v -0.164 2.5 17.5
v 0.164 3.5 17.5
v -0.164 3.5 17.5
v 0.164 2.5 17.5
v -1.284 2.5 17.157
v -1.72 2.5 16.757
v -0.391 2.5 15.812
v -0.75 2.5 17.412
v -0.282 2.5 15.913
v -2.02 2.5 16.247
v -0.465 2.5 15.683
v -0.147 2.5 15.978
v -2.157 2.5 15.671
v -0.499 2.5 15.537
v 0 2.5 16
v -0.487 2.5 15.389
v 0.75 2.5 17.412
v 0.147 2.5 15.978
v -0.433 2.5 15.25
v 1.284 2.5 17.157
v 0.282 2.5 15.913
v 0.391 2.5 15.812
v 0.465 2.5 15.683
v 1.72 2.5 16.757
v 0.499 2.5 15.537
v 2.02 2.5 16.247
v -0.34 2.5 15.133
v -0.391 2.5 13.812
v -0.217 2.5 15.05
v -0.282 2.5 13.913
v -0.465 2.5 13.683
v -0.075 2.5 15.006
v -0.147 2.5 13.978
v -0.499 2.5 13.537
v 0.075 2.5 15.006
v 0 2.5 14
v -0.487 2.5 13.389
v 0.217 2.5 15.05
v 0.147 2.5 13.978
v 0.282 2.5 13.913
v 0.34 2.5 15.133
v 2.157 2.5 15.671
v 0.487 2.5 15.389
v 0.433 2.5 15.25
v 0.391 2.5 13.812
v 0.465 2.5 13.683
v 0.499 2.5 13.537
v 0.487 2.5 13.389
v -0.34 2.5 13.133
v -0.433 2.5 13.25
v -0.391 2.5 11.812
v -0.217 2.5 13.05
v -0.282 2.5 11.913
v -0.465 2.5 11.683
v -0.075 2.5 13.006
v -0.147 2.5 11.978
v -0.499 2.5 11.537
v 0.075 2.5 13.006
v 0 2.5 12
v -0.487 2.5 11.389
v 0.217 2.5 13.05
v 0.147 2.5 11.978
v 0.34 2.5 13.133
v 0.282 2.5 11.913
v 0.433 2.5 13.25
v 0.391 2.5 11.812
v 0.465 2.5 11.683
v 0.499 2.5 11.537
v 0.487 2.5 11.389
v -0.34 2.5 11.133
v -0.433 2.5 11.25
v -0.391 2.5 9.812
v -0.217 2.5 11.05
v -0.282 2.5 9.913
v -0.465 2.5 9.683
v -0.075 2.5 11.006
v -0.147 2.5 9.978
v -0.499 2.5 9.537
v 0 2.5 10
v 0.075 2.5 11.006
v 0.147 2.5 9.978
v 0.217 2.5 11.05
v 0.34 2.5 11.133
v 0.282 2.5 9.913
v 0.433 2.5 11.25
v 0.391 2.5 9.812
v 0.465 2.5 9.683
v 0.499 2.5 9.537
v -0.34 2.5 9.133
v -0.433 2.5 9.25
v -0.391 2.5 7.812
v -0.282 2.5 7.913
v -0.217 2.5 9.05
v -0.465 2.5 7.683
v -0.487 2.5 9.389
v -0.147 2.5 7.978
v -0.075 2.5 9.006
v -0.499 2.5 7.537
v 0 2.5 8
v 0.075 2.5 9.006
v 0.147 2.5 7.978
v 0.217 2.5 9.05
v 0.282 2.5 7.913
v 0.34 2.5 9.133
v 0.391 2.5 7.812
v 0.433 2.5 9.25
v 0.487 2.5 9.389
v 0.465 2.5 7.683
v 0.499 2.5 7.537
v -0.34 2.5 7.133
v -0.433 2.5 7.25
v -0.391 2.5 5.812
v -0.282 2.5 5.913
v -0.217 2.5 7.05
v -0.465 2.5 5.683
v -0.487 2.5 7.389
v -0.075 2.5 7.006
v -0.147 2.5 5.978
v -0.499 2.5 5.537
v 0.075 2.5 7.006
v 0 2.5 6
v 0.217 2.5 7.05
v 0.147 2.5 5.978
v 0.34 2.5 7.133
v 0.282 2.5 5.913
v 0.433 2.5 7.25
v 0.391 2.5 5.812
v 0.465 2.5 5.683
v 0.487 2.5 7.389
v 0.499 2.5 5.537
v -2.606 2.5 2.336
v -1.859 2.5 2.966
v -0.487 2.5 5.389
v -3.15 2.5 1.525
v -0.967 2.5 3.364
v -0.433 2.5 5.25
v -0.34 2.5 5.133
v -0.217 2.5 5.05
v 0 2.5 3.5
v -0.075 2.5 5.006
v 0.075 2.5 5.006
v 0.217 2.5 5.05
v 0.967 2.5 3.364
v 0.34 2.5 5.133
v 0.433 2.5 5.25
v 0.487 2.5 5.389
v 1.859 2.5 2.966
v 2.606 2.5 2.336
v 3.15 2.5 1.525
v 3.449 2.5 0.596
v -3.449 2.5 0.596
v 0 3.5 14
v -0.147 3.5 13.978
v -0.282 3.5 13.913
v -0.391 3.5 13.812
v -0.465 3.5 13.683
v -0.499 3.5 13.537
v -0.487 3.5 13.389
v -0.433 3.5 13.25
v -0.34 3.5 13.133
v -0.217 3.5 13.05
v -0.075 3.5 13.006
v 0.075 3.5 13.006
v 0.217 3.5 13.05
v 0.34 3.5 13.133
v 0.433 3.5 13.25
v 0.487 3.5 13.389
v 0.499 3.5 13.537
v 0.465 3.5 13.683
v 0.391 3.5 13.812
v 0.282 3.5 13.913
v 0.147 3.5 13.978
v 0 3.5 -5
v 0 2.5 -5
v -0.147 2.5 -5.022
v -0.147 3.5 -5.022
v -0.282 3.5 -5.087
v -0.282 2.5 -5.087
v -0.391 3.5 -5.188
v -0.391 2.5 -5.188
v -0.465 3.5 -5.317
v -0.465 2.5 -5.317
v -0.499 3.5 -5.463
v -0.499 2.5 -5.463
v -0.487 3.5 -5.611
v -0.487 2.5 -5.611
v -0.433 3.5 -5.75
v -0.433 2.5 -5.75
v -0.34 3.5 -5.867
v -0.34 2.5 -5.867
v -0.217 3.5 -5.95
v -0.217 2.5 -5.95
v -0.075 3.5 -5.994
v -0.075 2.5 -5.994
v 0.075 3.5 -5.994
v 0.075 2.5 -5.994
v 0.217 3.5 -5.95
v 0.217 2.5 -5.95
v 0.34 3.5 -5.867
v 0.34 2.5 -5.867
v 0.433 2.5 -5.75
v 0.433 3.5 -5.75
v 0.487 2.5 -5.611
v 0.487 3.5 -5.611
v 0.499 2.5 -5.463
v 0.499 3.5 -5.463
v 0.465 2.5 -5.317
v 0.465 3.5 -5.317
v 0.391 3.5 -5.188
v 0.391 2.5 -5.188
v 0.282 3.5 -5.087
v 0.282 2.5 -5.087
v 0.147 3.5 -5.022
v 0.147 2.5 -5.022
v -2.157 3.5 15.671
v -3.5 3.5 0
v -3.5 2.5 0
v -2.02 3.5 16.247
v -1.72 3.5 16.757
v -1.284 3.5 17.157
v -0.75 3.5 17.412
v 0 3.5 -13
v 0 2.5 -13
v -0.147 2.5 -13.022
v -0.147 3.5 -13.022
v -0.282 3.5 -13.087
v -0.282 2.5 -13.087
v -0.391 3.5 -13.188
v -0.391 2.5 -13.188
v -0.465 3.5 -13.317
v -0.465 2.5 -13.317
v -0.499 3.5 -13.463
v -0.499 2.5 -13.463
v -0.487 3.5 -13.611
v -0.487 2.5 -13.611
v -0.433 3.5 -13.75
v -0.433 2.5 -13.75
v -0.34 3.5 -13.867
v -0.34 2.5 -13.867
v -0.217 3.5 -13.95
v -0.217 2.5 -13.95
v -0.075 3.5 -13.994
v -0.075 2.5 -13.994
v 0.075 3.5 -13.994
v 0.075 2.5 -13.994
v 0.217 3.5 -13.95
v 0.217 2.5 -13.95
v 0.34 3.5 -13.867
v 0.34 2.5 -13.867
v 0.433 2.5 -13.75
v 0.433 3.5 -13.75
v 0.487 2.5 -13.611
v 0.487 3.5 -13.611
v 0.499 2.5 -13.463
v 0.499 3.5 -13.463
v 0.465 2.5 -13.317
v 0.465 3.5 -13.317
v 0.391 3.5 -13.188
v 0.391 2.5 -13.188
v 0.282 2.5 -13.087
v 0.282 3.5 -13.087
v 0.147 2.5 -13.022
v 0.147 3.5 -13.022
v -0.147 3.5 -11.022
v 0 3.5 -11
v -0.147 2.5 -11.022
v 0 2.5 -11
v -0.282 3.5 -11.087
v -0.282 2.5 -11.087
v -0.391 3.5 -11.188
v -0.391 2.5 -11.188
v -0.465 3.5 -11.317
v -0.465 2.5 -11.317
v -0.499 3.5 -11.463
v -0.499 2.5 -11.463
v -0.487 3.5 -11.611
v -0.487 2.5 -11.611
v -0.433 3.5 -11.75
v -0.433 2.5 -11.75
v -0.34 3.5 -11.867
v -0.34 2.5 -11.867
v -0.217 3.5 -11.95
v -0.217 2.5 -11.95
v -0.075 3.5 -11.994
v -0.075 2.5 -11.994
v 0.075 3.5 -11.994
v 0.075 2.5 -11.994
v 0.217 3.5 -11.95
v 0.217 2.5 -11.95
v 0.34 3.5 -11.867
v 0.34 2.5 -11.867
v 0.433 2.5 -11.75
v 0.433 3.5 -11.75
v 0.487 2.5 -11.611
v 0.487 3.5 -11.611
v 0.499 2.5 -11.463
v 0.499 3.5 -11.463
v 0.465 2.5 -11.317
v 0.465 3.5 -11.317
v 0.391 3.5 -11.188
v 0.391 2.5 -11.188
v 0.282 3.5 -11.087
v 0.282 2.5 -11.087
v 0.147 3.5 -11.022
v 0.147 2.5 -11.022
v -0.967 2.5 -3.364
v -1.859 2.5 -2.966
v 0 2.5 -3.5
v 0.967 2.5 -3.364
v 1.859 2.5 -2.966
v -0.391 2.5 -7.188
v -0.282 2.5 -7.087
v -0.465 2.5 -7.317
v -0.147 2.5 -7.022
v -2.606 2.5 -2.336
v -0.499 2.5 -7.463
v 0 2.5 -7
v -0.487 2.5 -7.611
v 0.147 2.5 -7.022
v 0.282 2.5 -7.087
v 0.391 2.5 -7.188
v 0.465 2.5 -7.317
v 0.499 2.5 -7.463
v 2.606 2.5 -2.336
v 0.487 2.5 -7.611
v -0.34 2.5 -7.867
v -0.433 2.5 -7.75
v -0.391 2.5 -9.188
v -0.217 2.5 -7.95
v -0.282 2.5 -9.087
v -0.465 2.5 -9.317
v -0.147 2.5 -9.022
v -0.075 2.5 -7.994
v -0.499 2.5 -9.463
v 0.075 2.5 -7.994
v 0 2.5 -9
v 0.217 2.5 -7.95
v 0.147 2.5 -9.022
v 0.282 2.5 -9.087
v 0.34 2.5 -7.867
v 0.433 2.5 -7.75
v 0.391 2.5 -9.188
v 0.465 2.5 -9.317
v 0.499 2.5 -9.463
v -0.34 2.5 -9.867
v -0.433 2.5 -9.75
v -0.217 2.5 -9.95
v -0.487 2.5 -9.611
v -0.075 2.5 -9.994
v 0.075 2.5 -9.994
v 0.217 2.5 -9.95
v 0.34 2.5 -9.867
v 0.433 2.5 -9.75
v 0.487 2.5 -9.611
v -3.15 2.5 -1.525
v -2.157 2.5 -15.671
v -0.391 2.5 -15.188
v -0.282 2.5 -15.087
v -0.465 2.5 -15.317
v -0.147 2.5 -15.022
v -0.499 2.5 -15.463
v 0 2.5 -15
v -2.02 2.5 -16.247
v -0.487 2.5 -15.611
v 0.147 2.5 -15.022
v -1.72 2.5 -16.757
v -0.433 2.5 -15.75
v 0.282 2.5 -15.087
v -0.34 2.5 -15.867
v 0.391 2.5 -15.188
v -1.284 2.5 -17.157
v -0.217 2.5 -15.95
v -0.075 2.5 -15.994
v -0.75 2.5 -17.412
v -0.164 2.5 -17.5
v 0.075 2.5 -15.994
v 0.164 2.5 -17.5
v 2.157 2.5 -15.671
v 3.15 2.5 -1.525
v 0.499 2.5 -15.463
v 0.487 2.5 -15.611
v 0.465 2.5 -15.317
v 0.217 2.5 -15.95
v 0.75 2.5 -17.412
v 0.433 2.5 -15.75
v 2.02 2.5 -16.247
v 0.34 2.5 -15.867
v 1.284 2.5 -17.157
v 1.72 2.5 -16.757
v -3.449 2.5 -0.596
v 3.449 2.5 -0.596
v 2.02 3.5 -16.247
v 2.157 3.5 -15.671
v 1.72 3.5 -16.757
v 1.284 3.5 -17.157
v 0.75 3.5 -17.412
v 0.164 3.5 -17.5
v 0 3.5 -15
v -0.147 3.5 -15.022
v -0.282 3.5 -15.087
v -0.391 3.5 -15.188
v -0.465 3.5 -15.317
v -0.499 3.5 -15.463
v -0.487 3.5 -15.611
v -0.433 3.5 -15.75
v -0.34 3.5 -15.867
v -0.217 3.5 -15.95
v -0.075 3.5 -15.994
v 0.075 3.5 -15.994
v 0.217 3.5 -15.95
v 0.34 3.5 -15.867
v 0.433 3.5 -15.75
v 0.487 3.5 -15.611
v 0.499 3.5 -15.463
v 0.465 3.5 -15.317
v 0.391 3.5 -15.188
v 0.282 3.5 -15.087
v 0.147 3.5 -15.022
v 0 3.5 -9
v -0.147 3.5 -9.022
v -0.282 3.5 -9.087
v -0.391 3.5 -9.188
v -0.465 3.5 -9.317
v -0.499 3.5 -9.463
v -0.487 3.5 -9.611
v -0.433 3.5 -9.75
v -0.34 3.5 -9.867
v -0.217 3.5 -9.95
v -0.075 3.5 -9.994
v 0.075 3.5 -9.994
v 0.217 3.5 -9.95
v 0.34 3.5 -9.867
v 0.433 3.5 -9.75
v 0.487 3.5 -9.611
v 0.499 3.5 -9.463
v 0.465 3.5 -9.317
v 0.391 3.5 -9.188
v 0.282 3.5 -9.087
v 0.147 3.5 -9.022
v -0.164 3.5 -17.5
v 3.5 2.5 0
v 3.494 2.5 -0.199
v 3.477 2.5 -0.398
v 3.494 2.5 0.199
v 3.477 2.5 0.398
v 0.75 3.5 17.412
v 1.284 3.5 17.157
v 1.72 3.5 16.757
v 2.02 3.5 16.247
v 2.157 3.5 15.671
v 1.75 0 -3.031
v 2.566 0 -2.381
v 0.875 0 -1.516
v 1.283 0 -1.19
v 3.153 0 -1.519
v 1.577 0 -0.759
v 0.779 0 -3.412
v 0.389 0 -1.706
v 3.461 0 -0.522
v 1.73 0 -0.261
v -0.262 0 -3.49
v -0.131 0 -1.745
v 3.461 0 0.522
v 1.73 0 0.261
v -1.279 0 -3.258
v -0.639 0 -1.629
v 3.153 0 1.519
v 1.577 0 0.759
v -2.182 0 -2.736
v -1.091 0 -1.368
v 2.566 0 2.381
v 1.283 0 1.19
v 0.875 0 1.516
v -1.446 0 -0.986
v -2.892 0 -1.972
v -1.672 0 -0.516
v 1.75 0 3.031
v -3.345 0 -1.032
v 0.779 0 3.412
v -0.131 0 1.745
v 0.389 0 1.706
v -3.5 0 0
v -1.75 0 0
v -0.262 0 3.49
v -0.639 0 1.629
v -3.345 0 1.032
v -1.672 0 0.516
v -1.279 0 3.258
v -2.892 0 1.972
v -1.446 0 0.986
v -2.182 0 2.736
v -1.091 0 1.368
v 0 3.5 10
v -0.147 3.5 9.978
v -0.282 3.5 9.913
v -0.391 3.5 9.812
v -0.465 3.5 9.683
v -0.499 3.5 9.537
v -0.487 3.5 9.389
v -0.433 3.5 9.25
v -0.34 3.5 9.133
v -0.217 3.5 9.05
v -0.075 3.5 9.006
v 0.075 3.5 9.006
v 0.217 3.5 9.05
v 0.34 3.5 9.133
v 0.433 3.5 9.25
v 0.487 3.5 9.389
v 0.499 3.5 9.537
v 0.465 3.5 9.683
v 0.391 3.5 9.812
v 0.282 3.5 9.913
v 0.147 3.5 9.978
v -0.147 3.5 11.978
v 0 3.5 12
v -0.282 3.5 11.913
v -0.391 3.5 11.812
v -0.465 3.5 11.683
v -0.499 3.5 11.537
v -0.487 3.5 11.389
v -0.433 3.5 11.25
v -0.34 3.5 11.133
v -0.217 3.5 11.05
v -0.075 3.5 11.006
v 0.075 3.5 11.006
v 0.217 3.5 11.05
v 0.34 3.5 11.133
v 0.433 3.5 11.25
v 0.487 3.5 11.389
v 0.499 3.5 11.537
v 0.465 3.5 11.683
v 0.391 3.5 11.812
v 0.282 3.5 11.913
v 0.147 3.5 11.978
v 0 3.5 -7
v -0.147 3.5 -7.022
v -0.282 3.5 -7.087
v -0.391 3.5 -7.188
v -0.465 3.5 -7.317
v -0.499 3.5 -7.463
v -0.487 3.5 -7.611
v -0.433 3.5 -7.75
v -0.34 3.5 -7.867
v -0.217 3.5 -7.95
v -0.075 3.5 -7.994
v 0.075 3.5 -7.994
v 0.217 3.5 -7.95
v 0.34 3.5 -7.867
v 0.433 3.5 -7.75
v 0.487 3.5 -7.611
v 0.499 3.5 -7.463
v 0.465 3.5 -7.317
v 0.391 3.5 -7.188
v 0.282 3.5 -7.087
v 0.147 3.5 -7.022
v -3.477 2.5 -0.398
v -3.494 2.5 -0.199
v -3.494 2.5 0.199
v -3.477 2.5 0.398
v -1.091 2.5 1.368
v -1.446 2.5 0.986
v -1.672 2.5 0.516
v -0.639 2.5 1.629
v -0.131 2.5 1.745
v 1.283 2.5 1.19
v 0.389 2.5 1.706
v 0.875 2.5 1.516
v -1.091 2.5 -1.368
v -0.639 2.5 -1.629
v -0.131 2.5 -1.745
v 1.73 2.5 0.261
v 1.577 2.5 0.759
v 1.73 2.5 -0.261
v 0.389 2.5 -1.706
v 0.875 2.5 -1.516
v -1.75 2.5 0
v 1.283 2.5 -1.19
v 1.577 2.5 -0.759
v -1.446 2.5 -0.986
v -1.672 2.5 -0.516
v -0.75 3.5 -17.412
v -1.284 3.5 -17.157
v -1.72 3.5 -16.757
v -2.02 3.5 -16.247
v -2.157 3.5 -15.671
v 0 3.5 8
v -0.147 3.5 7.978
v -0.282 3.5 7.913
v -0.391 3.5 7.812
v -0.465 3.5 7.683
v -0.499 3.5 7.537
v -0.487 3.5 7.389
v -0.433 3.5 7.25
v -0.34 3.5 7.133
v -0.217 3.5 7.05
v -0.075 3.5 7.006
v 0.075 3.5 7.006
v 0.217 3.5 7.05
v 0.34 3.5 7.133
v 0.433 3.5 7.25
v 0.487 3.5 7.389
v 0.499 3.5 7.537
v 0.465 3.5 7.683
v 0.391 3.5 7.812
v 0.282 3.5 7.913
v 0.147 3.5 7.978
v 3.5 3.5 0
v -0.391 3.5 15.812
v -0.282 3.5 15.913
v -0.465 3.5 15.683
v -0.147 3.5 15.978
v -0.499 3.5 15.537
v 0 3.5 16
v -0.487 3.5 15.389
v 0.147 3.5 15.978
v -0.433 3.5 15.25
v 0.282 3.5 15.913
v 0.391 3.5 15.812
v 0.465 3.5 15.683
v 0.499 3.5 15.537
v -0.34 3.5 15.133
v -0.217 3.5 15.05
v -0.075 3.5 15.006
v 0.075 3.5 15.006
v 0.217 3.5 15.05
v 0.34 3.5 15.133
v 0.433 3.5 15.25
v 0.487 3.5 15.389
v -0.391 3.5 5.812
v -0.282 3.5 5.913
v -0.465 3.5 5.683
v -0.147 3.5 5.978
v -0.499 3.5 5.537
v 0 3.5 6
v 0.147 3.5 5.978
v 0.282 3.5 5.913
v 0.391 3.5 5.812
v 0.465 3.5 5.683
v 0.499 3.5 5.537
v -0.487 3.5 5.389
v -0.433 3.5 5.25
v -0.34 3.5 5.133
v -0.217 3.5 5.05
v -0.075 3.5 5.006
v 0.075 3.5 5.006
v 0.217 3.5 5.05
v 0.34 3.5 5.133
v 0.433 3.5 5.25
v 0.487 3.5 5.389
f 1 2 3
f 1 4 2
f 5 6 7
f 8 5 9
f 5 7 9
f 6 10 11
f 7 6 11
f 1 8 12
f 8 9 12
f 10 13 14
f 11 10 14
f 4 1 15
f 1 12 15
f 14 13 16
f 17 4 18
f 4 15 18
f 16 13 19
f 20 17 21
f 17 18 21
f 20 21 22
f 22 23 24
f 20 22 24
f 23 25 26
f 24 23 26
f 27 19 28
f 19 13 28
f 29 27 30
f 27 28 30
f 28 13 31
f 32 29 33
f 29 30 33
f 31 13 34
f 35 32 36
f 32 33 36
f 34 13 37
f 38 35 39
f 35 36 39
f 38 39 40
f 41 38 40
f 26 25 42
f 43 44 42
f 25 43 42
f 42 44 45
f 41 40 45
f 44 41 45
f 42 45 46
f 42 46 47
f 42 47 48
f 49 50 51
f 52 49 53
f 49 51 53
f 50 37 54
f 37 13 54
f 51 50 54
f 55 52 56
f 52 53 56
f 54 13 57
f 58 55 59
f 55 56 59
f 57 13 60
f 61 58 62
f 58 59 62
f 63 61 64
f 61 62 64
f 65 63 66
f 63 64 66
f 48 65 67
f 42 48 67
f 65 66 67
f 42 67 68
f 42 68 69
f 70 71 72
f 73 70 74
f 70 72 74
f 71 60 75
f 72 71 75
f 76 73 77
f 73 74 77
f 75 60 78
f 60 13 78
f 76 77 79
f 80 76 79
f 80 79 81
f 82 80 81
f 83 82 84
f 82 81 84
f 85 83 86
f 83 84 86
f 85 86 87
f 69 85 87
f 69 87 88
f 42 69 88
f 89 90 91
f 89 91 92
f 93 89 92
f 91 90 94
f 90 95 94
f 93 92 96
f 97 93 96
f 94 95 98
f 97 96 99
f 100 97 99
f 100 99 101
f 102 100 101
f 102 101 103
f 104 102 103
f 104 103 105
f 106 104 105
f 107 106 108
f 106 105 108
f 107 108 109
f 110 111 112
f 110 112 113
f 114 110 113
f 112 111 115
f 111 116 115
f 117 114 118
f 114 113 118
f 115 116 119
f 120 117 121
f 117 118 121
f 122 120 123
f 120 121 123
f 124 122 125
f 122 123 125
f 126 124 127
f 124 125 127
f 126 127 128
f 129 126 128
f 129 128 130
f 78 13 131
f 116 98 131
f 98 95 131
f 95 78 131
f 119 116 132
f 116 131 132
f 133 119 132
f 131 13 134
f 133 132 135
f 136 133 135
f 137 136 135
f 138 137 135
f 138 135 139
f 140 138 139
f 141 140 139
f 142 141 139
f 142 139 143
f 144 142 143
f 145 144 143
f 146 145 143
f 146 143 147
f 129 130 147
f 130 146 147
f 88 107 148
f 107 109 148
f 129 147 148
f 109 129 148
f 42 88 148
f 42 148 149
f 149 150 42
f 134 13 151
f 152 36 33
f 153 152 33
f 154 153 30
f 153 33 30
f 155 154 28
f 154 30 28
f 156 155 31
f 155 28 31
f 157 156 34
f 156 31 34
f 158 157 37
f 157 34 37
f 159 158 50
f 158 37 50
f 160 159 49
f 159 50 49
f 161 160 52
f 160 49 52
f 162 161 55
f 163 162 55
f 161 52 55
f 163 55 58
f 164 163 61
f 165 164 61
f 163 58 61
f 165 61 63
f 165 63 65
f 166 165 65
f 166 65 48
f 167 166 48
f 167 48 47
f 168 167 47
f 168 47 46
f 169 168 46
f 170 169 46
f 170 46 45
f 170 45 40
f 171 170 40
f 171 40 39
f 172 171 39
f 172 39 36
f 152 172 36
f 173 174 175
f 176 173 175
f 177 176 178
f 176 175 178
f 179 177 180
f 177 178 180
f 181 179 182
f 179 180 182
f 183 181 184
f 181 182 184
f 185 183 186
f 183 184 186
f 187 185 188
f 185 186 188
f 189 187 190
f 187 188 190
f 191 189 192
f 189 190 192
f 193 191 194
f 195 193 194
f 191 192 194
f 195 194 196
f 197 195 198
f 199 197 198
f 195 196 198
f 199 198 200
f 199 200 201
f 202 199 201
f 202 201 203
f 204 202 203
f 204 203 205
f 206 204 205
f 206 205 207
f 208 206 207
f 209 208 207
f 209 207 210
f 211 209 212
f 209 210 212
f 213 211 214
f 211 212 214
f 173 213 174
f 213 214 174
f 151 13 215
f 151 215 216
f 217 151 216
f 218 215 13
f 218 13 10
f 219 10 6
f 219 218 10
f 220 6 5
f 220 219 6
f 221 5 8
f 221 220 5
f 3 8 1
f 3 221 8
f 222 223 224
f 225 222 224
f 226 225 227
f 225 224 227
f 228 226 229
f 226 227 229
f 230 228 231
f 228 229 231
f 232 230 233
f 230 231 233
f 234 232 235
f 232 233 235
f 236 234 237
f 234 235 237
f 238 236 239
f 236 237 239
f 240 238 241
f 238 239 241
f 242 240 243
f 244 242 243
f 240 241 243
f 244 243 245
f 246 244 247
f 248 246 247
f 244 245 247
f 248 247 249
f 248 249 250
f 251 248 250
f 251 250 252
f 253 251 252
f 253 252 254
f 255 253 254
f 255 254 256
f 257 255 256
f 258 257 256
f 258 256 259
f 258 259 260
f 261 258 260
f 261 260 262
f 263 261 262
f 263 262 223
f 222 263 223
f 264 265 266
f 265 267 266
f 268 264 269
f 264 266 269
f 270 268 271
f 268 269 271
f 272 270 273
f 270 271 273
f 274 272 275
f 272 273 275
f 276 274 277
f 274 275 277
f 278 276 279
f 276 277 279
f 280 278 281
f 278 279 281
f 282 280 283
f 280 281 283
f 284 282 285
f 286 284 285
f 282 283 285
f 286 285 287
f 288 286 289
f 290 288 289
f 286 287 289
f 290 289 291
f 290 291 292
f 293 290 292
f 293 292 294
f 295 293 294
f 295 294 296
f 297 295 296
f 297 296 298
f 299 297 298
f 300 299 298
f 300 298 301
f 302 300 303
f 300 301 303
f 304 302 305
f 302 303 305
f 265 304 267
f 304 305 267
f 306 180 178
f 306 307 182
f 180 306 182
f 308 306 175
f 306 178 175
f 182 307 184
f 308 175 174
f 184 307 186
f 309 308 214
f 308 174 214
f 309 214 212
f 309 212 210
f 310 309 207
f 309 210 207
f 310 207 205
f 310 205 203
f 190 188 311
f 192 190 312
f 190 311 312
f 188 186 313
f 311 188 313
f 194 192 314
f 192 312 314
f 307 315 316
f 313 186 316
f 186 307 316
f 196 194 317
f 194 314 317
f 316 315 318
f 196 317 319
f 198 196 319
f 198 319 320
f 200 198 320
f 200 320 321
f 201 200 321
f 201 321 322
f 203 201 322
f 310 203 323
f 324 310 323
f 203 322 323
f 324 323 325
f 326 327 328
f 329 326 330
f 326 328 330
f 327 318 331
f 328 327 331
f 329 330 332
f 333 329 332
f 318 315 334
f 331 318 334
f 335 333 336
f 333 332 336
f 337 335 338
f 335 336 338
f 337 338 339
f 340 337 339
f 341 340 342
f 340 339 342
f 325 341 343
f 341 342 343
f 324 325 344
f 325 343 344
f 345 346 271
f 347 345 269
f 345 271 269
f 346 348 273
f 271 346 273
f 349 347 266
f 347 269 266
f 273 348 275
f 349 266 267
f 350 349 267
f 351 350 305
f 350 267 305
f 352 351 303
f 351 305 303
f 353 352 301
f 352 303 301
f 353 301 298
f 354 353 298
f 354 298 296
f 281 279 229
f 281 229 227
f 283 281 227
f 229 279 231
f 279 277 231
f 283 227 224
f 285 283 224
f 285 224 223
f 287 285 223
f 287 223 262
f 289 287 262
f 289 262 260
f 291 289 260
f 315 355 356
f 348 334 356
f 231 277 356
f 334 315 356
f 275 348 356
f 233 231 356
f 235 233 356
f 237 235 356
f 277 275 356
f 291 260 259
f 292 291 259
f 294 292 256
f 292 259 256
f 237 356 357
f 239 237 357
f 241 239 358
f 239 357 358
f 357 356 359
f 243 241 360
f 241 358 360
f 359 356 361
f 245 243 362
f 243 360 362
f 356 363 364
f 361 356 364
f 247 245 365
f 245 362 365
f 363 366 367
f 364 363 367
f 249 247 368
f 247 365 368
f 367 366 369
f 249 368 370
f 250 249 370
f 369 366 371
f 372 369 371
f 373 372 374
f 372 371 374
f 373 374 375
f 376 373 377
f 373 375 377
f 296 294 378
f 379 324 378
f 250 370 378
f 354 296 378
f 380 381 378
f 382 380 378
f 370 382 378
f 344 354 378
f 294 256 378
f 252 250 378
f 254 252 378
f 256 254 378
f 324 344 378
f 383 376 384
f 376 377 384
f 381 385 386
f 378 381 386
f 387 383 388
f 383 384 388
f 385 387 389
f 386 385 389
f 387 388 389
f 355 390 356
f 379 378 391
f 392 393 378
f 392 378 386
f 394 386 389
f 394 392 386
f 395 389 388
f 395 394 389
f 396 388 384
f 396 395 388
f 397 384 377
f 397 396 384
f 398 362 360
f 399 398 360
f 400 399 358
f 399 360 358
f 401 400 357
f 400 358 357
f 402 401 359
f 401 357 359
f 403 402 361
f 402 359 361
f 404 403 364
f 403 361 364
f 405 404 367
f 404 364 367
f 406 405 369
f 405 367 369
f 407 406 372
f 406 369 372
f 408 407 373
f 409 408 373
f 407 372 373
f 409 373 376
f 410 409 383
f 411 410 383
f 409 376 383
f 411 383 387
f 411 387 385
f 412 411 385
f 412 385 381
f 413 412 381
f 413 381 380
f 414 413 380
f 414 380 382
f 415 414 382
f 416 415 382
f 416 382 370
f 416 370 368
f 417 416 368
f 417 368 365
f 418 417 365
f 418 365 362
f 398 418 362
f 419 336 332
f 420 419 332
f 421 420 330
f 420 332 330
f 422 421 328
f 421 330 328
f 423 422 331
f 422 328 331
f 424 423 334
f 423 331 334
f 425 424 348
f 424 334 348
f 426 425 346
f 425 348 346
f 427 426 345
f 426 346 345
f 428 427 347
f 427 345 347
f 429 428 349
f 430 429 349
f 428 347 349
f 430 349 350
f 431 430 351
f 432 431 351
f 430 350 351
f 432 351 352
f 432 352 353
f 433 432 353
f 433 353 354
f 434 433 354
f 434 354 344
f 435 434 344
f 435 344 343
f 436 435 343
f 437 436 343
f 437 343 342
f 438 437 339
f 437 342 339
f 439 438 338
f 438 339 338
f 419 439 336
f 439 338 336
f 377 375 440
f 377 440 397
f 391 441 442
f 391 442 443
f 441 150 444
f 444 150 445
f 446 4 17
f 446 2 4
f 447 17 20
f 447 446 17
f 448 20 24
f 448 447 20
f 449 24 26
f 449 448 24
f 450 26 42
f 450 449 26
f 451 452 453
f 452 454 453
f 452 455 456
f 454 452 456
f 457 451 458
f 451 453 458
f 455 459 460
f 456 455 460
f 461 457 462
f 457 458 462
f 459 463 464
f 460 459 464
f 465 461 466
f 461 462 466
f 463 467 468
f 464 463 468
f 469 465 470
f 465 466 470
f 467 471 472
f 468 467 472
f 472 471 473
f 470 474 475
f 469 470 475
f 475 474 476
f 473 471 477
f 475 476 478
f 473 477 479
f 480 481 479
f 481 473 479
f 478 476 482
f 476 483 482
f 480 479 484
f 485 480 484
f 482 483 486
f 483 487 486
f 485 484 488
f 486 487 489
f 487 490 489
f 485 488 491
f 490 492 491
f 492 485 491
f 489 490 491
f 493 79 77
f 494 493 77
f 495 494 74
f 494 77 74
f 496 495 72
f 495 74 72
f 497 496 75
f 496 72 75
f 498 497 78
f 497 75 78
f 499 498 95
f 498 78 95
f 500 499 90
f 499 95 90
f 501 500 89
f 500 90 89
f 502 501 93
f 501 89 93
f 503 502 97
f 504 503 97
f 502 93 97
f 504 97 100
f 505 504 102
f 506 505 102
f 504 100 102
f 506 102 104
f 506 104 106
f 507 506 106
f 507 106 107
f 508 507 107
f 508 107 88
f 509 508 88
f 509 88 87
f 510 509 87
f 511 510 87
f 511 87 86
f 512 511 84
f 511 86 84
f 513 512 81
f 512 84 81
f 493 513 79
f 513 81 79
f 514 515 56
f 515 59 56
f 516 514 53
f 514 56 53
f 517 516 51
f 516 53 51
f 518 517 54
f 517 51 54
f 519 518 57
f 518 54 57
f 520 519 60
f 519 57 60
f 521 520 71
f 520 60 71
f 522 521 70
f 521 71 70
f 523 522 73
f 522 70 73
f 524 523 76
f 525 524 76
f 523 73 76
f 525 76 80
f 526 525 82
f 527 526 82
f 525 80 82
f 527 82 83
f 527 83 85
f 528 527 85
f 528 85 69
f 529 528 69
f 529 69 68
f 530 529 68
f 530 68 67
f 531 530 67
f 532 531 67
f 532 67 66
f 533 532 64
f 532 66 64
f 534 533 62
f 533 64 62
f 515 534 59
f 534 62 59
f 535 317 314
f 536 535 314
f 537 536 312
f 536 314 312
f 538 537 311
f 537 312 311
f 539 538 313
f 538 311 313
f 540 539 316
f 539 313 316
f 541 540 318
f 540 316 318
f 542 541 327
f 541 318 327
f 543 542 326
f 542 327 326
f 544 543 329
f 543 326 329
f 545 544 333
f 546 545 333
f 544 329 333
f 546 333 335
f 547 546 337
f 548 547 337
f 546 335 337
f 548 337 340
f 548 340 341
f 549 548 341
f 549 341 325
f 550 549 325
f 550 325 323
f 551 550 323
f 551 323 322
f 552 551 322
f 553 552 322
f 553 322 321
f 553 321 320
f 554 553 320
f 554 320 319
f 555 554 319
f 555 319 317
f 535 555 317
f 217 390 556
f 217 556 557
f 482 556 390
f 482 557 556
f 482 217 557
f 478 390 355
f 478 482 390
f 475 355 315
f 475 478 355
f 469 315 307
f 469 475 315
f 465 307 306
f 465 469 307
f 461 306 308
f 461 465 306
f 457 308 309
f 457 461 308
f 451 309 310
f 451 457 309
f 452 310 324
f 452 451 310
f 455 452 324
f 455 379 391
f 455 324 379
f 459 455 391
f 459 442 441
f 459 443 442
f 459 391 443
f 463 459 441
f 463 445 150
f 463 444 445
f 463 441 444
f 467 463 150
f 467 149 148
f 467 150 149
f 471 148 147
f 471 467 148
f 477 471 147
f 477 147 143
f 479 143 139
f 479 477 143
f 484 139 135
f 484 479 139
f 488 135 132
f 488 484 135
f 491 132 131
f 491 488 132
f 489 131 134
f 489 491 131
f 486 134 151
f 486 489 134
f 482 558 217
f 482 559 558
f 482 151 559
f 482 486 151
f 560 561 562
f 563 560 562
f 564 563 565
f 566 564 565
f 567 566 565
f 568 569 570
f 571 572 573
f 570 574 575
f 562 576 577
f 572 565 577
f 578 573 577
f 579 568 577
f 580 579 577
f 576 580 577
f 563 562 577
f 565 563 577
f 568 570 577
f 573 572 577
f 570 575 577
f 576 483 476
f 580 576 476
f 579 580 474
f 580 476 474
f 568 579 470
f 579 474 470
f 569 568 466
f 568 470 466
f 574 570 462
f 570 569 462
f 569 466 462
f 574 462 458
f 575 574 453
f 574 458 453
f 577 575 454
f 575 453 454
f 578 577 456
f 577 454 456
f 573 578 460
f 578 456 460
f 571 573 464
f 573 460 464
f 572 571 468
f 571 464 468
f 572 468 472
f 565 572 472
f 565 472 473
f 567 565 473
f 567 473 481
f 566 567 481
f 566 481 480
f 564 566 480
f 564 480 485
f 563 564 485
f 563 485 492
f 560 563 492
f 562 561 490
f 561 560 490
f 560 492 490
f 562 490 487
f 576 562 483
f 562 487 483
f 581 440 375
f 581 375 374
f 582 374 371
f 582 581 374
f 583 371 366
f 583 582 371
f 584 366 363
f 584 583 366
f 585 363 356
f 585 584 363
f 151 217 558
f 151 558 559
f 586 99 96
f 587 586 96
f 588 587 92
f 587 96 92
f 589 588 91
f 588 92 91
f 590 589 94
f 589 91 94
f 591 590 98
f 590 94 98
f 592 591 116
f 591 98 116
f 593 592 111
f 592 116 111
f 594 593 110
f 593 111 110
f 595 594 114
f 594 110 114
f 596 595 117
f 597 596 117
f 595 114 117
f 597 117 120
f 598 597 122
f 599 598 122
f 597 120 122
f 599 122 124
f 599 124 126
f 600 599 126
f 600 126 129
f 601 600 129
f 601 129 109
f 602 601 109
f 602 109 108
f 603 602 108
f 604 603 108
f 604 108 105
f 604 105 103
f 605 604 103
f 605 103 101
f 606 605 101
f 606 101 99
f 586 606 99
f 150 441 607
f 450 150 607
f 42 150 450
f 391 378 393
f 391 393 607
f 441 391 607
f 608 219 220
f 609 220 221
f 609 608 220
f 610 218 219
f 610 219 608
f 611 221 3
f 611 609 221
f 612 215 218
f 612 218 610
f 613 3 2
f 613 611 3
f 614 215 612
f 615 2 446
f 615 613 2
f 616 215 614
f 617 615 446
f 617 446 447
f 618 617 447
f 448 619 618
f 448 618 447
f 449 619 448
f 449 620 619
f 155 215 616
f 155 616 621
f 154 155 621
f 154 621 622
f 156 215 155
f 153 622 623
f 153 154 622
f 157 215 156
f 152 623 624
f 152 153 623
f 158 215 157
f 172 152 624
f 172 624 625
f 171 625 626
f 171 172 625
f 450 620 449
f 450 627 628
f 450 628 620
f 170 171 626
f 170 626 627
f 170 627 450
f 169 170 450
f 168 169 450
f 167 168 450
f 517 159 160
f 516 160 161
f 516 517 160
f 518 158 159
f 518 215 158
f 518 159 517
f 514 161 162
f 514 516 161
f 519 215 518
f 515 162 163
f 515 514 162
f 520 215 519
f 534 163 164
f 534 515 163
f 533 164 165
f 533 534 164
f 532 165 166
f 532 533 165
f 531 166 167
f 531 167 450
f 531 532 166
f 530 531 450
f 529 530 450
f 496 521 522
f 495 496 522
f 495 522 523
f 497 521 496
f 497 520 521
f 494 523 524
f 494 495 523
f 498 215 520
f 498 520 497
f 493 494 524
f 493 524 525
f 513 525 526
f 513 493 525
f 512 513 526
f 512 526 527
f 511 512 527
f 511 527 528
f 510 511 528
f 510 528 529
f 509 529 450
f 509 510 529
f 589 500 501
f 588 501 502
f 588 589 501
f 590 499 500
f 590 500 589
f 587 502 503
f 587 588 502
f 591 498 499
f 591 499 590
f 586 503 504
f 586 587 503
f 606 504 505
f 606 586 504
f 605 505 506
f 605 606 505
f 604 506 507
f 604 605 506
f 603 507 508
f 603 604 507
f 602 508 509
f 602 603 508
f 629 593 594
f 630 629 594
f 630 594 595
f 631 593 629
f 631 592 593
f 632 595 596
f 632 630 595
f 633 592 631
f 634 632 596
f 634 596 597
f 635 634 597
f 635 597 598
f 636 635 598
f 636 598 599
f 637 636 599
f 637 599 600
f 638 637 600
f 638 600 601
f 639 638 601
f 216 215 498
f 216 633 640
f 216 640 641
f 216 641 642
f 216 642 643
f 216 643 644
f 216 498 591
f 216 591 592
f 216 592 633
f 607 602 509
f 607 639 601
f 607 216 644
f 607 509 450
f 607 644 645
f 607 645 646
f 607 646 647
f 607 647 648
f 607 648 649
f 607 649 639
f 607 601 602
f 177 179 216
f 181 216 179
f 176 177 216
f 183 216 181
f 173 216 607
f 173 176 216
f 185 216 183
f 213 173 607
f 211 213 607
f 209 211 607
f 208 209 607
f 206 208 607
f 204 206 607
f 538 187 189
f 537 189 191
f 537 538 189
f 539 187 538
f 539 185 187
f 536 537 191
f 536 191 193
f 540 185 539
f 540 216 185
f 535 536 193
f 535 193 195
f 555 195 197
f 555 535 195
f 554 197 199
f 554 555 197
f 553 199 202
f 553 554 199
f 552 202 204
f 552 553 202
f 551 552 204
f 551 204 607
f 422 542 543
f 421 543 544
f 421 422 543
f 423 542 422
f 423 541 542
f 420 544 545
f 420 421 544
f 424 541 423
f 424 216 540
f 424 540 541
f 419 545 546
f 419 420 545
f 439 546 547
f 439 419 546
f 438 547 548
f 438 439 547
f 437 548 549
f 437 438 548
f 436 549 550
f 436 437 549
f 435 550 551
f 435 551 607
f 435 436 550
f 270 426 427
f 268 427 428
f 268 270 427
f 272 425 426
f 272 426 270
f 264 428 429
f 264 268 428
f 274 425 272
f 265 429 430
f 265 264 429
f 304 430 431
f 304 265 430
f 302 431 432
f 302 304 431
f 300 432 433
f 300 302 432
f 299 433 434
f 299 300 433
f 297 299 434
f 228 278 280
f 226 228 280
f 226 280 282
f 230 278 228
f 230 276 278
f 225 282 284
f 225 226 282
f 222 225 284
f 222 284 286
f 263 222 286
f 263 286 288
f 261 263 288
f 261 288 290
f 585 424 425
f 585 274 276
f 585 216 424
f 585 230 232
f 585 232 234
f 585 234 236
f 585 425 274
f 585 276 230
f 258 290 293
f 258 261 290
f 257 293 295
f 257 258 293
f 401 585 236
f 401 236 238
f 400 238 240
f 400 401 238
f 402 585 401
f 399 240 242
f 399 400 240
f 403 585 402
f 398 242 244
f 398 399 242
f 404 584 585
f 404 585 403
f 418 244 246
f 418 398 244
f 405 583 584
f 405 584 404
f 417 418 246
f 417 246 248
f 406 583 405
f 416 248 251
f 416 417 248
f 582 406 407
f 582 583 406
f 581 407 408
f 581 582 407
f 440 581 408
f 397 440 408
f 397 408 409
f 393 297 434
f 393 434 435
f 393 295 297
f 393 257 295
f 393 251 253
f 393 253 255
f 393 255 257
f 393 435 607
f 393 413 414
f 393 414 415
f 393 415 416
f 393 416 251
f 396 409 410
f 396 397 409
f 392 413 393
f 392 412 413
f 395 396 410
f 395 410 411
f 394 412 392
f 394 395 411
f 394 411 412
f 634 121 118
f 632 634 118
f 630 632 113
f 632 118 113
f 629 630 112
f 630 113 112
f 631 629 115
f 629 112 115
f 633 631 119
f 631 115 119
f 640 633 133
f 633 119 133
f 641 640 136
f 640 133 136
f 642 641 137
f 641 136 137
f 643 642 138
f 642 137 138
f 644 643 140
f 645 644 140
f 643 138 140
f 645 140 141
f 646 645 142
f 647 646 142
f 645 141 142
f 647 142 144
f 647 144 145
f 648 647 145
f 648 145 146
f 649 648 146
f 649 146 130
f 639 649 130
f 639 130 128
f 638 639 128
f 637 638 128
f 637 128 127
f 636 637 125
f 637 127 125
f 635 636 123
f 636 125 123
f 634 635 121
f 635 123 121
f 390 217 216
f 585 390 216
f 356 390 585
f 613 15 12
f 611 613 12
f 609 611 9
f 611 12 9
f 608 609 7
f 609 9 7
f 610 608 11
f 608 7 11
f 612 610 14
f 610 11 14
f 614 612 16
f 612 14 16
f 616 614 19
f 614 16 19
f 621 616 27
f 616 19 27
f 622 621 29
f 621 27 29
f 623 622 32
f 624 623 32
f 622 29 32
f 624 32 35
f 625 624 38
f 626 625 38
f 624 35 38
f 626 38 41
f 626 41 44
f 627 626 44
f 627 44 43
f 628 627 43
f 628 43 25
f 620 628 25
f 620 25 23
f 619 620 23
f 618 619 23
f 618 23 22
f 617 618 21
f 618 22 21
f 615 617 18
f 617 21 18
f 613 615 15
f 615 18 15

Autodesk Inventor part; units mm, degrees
ref_plane "YZ Plane" through (0, 0, 0) normal (1, 0, 0) x (0, 1, 0)
ref_plane "XZ Plane" through (0, 0, 0) normal (0, 1, 0) x (-1, 0, 0)
ref_plane "XY Plane" through (0, 0, 0) normal (0, 0, 1) x (1, 0, 0)
sketch "Skizze1" plane through (0, 0, 0) normal (0, 1, 0) x (-1, 0, 0)
  circle A0 centre (0, 0) radius 1.75
  circle A1 centre (0, 0) radius 3.5
  dimension "d2" = 3.5
  dimension "d3" = 7
extrude "Extrusion1" add sketch "Skizze1" along normal blind 2.5
sketch "Skizze2" plane through (0, 2.5, 0) normal (0, 1, 0) x (1, 0, 0)
  line L0 (-2, 17.5) -> (2, 17.5)
  line L1 (2, 17.5) -> (2, -17.5)
  line L2 (2, -17.5) -> (-2, -17.5)
  line L3 (-2, -17.5) -> (-2, 17.5)
  line L4 (-2, 17.5) -> (2, -17.5) construction
  line L5 (2, 17.5) -> (-2, -17.5) construction
  circle A0 centre (0, 0) radius 3.5 projected
  line L6 (3.5, 0) -> (2, -17.5)
  line L7 (-2, -17.5) -> (-3.5, 0)
  circle A1 centre (0, 0) radius 3.5 projected
  line L8 (-3.5, 0) -> (-2, 17.5)
  line L9 (2, 17.5) -> (3.5, 0)
  dimension "d6" = 35
  dimension "d7" = 4
extrude "Extrusion2" add sketch "Skizze2" along normal blind 1 contours L0 L1 A0 L3 | L3 A0 L8 | L9 A0 L1 | A0 L1 L3 | L3 A0 L7 L8 | A0 L9 L6 L1 | A0 L1 L2 L3 | L3 L7 A0 | A0 L6 L1
sketch "Skizze3" plane through (0, 3.5, 0) normal (0, 1, 0) x (1, 0, 0)
  line L0 (-2, -17.5) -> (2, -17.5) projected
  point P0 (0, 0)
  point P1 (0, -15.5)
  point P2 (0, -13.5)
  point P3 (0, -11.5)
  point P4 (0, -9.5)
  point P5 (0, -7.5)
  point P6 (0, -5.5)
  point P7 (0, 5.5)
  point P8 (0, 7.5)
  point P9 (0, 9.5)
  point P10 (0, 11.5)
  point P11 (0, 13.5)
  point P12 (0, 15.5)
  dimension "d10" = 2
  dimension "d11" = 2
  dimension "d12" = 2
  dimension "d13" = 2
  dimension "d14" = 2
  dimension "d15" = 2
  dimension "d16" = 0
  dimension "d17" = 0
  dimension "d18" = 2
  dimension "d19" = 2
  dimension "d20" = 2
  dimension "d21" = 2
  dimension "d22" = 2
  dimension "d24" = 5.5
hole "Bohrung1" at (0, 3.5, 15.5) at (0, 3.5, 13.5) at (0, 3.5, 11.5) at (0, 3.5, 9.5) at (0, 3.5, 7.5) at (0, 3.5, 5.5) at (0, 3.5, -5.5) at (0, 3.5, -7.5) at (0, 3.5, -9.5) at (0, 3.5, -11.5) at (0, 3.5, -13.5) at (0, 3.5, -15.5) direction (0, -1, 0) diameter 1 depth 8 tip angle 118
fillet "Rundung1" radius 2 4 edges at (2, 3, 17.5) (-2, 3, 17.5) (2, 3, -17.5) (-2, 3, -17.5)
properties part number "horn"
